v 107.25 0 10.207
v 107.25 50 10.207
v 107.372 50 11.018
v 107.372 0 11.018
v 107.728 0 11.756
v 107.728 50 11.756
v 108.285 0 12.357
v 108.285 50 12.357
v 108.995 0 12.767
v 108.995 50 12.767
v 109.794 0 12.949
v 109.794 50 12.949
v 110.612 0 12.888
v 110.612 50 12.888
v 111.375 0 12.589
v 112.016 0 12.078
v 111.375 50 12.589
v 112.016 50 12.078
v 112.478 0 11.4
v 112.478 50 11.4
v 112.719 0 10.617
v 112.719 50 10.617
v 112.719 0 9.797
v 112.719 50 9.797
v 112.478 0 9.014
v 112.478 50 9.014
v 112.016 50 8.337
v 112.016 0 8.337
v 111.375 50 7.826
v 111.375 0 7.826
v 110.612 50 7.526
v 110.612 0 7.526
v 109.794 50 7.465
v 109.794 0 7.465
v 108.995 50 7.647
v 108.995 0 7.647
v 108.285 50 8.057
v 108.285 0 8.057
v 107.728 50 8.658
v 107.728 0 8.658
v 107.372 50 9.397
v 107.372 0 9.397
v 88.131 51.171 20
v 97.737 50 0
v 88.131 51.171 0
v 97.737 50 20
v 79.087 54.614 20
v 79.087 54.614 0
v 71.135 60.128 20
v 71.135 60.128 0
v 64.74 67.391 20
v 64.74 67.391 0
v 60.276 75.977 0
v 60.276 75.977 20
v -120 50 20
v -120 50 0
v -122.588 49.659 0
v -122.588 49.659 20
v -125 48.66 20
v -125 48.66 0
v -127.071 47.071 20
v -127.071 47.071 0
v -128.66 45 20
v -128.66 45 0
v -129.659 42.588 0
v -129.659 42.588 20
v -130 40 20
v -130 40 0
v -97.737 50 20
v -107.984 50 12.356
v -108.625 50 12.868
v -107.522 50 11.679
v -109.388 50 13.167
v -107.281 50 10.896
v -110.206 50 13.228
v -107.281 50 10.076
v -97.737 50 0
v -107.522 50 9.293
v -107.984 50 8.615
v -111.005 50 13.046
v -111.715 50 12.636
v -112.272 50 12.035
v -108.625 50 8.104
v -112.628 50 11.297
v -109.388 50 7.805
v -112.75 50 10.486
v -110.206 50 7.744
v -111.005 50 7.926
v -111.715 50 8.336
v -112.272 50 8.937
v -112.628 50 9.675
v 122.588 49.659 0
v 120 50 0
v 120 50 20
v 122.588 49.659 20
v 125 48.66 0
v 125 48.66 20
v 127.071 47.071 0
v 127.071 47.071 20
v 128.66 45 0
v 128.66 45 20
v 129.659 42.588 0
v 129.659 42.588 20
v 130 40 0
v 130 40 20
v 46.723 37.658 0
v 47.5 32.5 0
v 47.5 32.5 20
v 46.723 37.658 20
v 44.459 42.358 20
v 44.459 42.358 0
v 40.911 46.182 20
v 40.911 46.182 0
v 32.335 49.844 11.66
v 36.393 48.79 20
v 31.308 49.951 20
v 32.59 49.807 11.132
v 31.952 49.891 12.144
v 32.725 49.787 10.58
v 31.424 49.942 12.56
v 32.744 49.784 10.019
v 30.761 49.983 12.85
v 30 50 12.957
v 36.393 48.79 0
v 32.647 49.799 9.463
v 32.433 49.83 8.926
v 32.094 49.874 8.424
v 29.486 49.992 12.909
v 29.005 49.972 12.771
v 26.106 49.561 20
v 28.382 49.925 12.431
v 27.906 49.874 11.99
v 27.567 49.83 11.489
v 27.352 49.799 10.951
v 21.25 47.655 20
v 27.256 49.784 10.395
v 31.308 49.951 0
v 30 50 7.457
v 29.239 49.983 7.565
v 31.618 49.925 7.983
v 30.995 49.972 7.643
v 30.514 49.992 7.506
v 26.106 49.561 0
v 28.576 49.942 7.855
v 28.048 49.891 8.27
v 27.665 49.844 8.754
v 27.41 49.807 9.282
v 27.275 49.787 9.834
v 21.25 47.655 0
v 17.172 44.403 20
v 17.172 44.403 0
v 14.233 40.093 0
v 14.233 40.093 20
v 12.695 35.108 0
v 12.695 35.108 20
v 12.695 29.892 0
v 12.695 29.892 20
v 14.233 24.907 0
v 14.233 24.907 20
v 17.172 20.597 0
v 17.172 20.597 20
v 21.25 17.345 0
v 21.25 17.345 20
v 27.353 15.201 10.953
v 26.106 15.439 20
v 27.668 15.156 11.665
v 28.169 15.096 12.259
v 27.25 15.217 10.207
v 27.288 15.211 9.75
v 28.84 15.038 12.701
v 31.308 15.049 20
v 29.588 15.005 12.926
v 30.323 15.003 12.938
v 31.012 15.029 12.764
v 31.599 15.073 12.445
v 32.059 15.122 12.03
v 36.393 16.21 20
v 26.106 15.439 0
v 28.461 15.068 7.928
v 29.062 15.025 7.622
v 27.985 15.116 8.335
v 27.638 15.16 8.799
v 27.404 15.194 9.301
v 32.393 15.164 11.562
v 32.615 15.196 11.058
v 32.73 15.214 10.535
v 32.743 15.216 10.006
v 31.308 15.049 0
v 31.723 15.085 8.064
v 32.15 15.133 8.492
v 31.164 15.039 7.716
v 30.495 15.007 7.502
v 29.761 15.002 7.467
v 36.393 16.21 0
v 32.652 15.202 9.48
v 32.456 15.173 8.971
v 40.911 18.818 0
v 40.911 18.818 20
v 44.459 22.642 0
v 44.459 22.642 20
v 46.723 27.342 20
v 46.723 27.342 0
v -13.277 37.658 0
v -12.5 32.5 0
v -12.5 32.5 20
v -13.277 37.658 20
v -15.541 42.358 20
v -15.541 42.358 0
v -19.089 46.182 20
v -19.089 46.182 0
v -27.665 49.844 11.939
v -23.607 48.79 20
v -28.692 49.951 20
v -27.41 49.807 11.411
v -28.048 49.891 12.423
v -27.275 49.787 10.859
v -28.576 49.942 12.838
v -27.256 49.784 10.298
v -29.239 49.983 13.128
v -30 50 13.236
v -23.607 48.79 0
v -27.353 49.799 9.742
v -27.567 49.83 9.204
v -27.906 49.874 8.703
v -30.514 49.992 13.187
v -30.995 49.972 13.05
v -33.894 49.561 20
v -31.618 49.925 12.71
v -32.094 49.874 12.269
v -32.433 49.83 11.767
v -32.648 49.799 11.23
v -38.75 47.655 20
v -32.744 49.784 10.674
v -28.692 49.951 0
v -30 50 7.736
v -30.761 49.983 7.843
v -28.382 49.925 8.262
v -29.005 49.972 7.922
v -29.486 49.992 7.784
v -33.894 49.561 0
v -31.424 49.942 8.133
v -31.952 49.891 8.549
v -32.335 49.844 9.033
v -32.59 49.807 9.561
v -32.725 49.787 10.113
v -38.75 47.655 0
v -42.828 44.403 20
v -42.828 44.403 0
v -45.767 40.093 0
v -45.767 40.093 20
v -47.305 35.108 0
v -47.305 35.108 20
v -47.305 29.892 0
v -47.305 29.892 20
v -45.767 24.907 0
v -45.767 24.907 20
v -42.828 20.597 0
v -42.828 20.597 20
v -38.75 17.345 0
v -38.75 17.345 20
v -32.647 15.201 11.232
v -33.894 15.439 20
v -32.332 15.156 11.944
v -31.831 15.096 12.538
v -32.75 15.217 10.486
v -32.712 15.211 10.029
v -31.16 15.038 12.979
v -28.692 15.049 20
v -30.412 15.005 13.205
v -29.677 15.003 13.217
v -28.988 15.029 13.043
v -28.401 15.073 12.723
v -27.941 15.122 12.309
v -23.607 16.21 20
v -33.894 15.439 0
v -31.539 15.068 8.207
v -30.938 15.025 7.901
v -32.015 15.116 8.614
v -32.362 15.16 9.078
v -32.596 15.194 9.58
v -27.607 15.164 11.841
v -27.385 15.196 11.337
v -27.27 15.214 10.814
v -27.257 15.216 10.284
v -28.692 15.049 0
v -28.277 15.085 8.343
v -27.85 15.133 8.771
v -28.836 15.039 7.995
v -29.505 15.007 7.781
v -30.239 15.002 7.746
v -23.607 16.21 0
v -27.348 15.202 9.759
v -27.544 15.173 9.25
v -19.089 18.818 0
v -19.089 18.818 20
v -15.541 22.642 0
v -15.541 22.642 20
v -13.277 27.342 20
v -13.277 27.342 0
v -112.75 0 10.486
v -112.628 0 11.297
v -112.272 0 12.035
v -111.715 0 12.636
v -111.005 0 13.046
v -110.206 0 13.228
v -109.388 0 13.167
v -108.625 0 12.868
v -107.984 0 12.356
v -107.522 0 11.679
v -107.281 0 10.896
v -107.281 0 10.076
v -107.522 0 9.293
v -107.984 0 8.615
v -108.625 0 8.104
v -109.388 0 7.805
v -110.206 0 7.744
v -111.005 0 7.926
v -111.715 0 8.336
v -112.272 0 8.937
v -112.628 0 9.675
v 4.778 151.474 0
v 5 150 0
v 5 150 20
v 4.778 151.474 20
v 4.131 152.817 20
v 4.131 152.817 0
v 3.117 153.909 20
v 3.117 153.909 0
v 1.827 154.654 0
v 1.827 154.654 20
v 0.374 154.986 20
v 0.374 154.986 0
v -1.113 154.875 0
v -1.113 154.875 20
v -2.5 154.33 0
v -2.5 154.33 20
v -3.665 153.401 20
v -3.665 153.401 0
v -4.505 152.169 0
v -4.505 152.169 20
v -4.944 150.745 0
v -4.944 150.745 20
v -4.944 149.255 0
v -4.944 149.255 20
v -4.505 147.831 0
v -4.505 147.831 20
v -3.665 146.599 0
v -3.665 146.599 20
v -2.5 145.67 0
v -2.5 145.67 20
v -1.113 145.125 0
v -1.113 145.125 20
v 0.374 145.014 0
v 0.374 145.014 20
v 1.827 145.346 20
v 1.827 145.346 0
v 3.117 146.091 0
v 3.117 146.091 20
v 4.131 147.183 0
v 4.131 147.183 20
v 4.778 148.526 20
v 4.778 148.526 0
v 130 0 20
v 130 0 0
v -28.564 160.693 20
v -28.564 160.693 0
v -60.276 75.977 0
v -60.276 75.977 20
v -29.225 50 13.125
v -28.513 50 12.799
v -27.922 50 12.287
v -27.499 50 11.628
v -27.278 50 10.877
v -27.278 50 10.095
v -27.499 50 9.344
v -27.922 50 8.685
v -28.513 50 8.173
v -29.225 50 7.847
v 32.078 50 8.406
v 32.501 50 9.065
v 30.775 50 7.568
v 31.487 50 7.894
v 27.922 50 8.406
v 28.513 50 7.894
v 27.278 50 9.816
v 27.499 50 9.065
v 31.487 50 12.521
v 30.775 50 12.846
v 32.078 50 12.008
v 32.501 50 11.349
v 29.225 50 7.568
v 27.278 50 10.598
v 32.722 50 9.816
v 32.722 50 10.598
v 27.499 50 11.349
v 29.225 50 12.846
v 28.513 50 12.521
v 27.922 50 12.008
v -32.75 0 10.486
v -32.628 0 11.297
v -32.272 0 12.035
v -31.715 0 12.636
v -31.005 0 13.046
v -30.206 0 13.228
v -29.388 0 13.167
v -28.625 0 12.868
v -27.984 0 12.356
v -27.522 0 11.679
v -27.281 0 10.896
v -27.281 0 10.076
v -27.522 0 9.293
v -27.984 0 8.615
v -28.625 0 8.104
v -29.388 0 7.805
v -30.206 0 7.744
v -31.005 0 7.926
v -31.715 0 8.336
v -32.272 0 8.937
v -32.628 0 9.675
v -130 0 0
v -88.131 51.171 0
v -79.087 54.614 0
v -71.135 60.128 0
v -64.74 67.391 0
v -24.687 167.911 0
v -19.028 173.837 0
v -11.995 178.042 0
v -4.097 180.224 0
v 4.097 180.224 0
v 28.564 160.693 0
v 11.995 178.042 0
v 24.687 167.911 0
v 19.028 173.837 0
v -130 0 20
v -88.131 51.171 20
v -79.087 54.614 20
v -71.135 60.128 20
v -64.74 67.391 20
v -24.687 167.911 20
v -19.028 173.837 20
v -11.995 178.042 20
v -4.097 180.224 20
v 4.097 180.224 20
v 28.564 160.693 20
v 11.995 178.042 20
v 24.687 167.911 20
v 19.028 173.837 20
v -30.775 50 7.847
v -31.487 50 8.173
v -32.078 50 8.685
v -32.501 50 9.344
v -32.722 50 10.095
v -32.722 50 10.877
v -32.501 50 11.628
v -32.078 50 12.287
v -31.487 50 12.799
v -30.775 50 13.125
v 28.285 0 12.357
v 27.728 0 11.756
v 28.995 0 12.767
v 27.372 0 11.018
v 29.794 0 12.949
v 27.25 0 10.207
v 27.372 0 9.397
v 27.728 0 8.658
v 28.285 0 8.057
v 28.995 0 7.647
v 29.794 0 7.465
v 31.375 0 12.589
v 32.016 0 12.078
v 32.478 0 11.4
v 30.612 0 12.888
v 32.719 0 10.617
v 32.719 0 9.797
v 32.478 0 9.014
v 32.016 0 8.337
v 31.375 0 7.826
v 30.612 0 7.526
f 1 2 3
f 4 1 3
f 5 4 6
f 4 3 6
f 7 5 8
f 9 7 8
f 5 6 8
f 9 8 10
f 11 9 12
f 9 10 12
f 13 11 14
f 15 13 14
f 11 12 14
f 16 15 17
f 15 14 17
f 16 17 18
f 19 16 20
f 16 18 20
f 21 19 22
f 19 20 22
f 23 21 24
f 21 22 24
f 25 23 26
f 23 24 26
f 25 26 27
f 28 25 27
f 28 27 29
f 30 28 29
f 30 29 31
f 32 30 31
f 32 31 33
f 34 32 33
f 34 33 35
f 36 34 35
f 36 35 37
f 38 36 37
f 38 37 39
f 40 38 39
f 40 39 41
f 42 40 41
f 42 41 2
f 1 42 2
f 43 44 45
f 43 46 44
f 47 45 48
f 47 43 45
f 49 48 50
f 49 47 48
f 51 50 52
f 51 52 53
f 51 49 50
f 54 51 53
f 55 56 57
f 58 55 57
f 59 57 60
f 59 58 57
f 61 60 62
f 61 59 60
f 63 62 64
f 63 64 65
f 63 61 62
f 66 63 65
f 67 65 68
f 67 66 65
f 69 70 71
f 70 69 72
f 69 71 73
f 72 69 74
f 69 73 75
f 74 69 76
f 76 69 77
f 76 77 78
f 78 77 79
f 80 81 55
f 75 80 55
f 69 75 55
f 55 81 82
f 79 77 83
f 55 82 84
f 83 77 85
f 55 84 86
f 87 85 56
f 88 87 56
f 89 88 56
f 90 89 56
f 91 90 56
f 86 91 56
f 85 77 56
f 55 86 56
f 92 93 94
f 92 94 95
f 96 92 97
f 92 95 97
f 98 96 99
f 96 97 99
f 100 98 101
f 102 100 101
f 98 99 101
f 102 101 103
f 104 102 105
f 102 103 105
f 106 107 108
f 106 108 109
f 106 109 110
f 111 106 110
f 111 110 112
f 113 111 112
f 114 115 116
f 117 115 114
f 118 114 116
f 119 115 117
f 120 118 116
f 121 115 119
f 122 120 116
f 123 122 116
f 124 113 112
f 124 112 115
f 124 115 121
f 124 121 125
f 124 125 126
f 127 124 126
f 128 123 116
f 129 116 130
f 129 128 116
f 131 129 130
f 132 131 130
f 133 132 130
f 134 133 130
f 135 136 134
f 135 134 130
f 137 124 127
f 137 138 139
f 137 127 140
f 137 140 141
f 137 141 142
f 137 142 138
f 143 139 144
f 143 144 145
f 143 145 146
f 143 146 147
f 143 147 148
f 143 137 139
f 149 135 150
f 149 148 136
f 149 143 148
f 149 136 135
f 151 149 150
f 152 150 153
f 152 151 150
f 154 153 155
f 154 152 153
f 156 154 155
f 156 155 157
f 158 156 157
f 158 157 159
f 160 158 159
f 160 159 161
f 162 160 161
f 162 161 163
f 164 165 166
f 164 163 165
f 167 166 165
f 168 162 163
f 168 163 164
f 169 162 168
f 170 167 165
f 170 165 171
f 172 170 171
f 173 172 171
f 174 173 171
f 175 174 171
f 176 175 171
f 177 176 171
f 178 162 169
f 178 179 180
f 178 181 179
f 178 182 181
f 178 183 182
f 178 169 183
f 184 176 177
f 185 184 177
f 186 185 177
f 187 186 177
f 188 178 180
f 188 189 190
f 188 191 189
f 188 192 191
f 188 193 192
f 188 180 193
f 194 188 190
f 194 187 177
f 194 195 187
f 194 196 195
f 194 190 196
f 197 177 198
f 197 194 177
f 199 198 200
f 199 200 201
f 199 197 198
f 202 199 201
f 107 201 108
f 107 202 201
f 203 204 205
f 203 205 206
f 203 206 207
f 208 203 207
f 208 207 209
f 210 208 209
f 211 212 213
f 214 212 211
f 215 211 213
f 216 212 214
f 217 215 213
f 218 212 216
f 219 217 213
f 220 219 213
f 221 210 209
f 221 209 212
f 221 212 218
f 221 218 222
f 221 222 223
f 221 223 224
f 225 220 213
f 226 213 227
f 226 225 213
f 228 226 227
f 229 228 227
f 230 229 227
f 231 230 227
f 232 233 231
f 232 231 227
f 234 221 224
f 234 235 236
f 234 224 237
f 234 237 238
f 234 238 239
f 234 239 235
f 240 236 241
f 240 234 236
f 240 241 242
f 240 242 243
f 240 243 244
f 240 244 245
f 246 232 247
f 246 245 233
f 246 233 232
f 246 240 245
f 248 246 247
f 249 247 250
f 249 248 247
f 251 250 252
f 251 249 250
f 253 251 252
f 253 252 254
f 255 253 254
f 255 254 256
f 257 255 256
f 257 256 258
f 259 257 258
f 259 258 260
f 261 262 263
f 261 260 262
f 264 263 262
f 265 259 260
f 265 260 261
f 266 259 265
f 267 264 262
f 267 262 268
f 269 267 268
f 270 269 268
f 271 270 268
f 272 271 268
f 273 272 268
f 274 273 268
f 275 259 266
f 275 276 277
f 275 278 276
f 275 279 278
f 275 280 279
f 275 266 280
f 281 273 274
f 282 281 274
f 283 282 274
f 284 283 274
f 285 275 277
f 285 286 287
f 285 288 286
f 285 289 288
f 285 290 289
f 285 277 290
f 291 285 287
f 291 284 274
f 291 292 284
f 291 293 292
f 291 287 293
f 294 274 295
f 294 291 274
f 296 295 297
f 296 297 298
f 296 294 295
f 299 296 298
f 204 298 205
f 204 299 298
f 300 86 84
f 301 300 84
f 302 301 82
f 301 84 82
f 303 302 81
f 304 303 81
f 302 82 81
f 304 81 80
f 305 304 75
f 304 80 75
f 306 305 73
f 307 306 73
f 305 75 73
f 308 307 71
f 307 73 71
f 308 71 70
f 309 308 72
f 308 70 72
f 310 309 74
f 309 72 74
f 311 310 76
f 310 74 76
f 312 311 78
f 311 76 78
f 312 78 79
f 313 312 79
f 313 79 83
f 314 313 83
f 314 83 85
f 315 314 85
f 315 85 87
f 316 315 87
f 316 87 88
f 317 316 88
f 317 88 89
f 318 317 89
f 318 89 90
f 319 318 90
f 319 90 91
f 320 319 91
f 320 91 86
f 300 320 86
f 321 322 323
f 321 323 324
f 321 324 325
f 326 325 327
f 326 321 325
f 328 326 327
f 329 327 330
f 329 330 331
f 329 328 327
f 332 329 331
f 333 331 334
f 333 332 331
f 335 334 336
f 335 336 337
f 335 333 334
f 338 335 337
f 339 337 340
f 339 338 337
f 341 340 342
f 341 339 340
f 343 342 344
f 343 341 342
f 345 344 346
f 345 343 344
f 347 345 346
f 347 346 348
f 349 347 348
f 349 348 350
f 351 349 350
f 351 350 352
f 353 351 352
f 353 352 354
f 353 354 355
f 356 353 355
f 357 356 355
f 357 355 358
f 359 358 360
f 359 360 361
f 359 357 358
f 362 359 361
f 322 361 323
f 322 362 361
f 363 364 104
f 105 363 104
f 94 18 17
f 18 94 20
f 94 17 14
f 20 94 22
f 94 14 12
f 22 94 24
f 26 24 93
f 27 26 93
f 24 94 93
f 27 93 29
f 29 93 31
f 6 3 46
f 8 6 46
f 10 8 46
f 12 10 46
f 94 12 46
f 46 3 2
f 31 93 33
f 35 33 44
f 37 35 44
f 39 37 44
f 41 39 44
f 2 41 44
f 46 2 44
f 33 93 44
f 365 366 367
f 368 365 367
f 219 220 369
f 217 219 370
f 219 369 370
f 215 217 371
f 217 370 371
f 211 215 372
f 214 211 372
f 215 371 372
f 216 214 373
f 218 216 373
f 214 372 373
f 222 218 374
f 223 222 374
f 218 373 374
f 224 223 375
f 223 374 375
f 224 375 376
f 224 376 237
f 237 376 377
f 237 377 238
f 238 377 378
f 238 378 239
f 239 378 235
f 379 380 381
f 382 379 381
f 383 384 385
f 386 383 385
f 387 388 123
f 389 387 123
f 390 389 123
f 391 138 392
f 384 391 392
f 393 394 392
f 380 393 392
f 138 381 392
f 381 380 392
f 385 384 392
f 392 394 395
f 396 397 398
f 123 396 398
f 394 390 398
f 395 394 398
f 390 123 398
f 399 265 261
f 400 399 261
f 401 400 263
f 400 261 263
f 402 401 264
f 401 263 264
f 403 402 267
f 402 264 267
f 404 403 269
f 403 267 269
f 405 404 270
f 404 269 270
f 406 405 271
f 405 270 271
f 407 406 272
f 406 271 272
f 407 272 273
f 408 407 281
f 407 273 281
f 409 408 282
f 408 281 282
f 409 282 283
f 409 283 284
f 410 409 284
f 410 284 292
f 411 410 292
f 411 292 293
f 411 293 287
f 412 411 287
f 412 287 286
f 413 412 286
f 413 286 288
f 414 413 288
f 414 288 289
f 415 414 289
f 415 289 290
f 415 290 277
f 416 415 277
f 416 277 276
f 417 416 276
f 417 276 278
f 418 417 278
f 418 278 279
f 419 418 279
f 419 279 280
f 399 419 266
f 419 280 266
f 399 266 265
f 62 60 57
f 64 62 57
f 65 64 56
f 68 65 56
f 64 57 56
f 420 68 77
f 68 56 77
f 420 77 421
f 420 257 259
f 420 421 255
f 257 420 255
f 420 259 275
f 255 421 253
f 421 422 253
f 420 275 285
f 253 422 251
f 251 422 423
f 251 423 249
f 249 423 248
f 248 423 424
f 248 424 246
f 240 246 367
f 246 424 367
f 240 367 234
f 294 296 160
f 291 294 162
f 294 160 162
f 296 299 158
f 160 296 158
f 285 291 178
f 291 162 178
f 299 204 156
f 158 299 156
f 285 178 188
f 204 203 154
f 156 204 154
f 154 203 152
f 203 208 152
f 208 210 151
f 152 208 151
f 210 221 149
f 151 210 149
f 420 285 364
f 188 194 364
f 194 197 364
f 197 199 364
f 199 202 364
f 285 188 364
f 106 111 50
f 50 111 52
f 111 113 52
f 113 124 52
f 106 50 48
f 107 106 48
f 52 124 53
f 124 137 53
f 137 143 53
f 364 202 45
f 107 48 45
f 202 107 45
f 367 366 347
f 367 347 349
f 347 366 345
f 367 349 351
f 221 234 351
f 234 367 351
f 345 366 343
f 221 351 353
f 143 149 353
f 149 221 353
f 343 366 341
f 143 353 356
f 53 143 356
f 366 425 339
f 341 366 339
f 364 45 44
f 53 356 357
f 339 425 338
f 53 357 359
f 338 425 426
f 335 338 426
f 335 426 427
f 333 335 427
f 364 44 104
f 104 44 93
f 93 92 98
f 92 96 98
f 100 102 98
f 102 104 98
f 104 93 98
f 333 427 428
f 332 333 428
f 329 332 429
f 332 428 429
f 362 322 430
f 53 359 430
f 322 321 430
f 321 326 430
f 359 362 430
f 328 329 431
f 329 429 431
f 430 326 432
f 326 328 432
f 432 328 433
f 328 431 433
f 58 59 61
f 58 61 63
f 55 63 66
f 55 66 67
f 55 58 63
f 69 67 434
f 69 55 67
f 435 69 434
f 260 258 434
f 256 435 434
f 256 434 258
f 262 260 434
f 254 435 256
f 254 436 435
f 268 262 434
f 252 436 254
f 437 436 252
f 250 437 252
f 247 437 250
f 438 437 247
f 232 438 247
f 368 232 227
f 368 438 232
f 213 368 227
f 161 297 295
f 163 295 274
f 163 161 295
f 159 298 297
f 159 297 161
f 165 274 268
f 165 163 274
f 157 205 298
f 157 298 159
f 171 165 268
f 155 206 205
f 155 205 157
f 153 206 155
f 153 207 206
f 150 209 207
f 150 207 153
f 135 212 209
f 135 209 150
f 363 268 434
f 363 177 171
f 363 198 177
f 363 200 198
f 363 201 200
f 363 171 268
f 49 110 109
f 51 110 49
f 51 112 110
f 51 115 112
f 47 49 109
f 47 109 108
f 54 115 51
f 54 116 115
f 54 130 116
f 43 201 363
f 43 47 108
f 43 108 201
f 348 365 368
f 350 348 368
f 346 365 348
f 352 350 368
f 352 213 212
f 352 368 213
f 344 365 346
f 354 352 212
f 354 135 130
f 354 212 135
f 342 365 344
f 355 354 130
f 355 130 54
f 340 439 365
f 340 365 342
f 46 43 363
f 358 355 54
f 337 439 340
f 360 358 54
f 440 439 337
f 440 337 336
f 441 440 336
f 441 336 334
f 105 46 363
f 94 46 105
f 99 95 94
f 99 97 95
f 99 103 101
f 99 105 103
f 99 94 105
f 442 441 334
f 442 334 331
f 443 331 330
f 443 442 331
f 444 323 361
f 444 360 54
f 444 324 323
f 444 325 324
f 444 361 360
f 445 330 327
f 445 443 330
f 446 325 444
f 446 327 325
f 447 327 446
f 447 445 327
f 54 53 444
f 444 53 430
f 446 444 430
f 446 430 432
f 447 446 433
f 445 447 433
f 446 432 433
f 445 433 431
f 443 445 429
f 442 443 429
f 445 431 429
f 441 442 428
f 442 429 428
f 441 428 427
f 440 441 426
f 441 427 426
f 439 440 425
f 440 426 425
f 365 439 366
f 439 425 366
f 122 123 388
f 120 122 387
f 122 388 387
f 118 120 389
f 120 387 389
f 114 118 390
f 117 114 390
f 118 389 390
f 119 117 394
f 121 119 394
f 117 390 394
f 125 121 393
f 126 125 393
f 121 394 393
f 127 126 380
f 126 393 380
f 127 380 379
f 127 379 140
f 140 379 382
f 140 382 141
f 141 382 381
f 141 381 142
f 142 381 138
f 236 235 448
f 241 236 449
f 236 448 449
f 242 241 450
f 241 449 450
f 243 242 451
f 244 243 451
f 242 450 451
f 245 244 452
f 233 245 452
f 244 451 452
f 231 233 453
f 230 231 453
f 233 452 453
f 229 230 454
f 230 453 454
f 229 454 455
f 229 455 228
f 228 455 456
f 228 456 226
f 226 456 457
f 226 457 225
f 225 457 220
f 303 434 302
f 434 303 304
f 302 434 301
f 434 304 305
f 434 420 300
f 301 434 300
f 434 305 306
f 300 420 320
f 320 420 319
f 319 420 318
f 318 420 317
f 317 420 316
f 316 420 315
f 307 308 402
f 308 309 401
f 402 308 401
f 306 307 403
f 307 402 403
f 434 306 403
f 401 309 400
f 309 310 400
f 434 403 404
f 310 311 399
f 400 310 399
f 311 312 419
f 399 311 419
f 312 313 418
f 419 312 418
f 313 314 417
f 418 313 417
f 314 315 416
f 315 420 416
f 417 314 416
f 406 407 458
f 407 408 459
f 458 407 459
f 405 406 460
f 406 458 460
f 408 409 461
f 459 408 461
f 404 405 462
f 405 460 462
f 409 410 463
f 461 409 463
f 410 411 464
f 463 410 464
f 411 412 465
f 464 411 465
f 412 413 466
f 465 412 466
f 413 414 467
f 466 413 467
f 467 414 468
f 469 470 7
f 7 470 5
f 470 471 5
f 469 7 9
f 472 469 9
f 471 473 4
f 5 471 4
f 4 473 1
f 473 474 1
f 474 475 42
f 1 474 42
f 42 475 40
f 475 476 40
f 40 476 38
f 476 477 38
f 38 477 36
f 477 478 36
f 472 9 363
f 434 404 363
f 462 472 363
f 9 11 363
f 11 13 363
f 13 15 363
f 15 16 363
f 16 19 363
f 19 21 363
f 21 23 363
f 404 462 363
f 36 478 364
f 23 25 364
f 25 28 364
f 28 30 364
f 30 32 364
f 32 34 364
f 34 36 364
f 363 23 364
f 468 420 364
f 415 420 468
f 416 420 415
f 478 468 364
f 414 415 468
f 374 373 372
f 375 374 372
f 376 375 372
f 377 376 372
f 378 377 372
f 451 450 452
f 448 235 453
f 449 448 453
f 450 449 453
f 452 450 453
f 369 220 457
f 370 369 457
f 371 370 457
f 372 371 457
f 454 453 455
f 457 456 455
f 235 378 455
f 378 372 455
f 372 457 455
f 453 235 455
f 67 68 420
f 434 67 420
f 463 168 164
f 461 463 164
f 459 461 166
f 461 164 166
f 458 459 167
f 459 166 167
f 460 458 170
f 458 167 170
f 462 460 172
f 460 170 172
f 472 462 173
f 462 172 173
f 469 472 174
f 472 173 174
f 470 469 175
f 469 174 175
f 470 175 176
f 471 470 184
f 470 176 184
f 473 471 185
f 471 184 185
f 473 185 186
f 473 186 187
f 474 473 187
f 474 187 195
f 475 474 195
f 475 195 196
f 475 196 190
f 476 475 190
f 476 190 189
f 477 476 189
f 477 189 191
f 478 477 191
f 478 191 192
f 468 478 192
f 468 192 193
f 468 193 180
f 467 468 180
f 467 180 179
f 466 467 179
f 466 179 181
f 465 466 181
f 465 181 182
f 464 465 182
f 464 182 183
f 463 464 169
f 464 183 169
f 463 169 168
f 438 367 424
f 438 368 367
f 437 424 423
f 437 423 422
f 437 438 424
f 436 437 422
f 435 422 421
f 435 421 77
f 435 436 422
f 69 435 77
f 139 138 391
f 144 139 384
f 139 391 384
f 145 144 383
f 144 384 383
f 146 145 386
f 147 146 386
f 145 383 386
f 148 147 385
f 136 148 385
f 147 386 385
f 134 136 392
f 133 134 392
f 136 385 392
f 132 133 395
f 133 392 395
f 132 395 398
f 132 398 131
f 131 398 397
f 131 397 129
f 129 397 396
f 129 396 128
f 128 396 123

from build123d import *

# Parameters (mm, degrees)
F0_R     = 17.5
F0_R_2   = 5
F1_DEPTH = 20
F2_R     = 2.75
F3_DEPTH = 50.001
F4_R     = 40
F5_R     = 10


with BuildPart() as f1:
    # F0 (on Top) → F1 (new body)
    with BuildSketch(Plane.XY):
        with BuildLine():
            Line((-130, 0), (130, 0))
            Line((130, 0), (130, 50))
            Line((130, 50), (70, 50))
            Line((70, 50), (28.564314, 160.69252))
            ThreePointArc((28.564314, 160.69252), (0, 180.5), (-28.564314, 160.69252))
            Line((-28.564314, 160.69252), (-70, 50))
            Line((-70, 50), (-130, 50))
            Line((-130, 50), (-130, 0))
        make_face()
        with Locations((-30, 32.5)):
            Circle(F0_R, mode=Mode.SUBTRACT)
        with Locations((30, 32.5)):
            Circle(F0_R, mode=Mode.SUBTRACT)
        with Locations((0, 150)):
            Circle(F0_R_2, mode=Mode.SUBTRACT)
    extrude(amount=F1_DEPTH)

    # F2 (on face) → F3 (cut, through all)
    with BuildSketch(Plane(origin=(0, 50, 0), x_dir=(-1, 0, 0), z_dir=(0, 1, 0))):
        with Locations((-110, 10.207103)):
            Circle(F2_R)
        with Locations((110, 10.485964)):
            Circle(F2_R)
        with Locations((-30, 10.207103)):
            Circle(F2_R)
        with Locations((30, 10.485964)):
            Circle(F2_R)
    extrude(amount=-F3_DEPTH, mode=Mode.SUBTRACT)

    # F4
    f4_edges = [f1.edges().sort_by_distance(p)[0] for p in [
        (70, 50, 10),
        (-70, 50, 10),
    ]]
    fillet(f4_edges, radius=F4_R)

    # F5
    f5_edges = [f1.edges().sort_by_distance(p)[0] for p in [
        (130, 50, 10),
        (-130, 50, 10),
    ]]
    fillet(f5_edges, radius=F5_R)


solid = f1.part
